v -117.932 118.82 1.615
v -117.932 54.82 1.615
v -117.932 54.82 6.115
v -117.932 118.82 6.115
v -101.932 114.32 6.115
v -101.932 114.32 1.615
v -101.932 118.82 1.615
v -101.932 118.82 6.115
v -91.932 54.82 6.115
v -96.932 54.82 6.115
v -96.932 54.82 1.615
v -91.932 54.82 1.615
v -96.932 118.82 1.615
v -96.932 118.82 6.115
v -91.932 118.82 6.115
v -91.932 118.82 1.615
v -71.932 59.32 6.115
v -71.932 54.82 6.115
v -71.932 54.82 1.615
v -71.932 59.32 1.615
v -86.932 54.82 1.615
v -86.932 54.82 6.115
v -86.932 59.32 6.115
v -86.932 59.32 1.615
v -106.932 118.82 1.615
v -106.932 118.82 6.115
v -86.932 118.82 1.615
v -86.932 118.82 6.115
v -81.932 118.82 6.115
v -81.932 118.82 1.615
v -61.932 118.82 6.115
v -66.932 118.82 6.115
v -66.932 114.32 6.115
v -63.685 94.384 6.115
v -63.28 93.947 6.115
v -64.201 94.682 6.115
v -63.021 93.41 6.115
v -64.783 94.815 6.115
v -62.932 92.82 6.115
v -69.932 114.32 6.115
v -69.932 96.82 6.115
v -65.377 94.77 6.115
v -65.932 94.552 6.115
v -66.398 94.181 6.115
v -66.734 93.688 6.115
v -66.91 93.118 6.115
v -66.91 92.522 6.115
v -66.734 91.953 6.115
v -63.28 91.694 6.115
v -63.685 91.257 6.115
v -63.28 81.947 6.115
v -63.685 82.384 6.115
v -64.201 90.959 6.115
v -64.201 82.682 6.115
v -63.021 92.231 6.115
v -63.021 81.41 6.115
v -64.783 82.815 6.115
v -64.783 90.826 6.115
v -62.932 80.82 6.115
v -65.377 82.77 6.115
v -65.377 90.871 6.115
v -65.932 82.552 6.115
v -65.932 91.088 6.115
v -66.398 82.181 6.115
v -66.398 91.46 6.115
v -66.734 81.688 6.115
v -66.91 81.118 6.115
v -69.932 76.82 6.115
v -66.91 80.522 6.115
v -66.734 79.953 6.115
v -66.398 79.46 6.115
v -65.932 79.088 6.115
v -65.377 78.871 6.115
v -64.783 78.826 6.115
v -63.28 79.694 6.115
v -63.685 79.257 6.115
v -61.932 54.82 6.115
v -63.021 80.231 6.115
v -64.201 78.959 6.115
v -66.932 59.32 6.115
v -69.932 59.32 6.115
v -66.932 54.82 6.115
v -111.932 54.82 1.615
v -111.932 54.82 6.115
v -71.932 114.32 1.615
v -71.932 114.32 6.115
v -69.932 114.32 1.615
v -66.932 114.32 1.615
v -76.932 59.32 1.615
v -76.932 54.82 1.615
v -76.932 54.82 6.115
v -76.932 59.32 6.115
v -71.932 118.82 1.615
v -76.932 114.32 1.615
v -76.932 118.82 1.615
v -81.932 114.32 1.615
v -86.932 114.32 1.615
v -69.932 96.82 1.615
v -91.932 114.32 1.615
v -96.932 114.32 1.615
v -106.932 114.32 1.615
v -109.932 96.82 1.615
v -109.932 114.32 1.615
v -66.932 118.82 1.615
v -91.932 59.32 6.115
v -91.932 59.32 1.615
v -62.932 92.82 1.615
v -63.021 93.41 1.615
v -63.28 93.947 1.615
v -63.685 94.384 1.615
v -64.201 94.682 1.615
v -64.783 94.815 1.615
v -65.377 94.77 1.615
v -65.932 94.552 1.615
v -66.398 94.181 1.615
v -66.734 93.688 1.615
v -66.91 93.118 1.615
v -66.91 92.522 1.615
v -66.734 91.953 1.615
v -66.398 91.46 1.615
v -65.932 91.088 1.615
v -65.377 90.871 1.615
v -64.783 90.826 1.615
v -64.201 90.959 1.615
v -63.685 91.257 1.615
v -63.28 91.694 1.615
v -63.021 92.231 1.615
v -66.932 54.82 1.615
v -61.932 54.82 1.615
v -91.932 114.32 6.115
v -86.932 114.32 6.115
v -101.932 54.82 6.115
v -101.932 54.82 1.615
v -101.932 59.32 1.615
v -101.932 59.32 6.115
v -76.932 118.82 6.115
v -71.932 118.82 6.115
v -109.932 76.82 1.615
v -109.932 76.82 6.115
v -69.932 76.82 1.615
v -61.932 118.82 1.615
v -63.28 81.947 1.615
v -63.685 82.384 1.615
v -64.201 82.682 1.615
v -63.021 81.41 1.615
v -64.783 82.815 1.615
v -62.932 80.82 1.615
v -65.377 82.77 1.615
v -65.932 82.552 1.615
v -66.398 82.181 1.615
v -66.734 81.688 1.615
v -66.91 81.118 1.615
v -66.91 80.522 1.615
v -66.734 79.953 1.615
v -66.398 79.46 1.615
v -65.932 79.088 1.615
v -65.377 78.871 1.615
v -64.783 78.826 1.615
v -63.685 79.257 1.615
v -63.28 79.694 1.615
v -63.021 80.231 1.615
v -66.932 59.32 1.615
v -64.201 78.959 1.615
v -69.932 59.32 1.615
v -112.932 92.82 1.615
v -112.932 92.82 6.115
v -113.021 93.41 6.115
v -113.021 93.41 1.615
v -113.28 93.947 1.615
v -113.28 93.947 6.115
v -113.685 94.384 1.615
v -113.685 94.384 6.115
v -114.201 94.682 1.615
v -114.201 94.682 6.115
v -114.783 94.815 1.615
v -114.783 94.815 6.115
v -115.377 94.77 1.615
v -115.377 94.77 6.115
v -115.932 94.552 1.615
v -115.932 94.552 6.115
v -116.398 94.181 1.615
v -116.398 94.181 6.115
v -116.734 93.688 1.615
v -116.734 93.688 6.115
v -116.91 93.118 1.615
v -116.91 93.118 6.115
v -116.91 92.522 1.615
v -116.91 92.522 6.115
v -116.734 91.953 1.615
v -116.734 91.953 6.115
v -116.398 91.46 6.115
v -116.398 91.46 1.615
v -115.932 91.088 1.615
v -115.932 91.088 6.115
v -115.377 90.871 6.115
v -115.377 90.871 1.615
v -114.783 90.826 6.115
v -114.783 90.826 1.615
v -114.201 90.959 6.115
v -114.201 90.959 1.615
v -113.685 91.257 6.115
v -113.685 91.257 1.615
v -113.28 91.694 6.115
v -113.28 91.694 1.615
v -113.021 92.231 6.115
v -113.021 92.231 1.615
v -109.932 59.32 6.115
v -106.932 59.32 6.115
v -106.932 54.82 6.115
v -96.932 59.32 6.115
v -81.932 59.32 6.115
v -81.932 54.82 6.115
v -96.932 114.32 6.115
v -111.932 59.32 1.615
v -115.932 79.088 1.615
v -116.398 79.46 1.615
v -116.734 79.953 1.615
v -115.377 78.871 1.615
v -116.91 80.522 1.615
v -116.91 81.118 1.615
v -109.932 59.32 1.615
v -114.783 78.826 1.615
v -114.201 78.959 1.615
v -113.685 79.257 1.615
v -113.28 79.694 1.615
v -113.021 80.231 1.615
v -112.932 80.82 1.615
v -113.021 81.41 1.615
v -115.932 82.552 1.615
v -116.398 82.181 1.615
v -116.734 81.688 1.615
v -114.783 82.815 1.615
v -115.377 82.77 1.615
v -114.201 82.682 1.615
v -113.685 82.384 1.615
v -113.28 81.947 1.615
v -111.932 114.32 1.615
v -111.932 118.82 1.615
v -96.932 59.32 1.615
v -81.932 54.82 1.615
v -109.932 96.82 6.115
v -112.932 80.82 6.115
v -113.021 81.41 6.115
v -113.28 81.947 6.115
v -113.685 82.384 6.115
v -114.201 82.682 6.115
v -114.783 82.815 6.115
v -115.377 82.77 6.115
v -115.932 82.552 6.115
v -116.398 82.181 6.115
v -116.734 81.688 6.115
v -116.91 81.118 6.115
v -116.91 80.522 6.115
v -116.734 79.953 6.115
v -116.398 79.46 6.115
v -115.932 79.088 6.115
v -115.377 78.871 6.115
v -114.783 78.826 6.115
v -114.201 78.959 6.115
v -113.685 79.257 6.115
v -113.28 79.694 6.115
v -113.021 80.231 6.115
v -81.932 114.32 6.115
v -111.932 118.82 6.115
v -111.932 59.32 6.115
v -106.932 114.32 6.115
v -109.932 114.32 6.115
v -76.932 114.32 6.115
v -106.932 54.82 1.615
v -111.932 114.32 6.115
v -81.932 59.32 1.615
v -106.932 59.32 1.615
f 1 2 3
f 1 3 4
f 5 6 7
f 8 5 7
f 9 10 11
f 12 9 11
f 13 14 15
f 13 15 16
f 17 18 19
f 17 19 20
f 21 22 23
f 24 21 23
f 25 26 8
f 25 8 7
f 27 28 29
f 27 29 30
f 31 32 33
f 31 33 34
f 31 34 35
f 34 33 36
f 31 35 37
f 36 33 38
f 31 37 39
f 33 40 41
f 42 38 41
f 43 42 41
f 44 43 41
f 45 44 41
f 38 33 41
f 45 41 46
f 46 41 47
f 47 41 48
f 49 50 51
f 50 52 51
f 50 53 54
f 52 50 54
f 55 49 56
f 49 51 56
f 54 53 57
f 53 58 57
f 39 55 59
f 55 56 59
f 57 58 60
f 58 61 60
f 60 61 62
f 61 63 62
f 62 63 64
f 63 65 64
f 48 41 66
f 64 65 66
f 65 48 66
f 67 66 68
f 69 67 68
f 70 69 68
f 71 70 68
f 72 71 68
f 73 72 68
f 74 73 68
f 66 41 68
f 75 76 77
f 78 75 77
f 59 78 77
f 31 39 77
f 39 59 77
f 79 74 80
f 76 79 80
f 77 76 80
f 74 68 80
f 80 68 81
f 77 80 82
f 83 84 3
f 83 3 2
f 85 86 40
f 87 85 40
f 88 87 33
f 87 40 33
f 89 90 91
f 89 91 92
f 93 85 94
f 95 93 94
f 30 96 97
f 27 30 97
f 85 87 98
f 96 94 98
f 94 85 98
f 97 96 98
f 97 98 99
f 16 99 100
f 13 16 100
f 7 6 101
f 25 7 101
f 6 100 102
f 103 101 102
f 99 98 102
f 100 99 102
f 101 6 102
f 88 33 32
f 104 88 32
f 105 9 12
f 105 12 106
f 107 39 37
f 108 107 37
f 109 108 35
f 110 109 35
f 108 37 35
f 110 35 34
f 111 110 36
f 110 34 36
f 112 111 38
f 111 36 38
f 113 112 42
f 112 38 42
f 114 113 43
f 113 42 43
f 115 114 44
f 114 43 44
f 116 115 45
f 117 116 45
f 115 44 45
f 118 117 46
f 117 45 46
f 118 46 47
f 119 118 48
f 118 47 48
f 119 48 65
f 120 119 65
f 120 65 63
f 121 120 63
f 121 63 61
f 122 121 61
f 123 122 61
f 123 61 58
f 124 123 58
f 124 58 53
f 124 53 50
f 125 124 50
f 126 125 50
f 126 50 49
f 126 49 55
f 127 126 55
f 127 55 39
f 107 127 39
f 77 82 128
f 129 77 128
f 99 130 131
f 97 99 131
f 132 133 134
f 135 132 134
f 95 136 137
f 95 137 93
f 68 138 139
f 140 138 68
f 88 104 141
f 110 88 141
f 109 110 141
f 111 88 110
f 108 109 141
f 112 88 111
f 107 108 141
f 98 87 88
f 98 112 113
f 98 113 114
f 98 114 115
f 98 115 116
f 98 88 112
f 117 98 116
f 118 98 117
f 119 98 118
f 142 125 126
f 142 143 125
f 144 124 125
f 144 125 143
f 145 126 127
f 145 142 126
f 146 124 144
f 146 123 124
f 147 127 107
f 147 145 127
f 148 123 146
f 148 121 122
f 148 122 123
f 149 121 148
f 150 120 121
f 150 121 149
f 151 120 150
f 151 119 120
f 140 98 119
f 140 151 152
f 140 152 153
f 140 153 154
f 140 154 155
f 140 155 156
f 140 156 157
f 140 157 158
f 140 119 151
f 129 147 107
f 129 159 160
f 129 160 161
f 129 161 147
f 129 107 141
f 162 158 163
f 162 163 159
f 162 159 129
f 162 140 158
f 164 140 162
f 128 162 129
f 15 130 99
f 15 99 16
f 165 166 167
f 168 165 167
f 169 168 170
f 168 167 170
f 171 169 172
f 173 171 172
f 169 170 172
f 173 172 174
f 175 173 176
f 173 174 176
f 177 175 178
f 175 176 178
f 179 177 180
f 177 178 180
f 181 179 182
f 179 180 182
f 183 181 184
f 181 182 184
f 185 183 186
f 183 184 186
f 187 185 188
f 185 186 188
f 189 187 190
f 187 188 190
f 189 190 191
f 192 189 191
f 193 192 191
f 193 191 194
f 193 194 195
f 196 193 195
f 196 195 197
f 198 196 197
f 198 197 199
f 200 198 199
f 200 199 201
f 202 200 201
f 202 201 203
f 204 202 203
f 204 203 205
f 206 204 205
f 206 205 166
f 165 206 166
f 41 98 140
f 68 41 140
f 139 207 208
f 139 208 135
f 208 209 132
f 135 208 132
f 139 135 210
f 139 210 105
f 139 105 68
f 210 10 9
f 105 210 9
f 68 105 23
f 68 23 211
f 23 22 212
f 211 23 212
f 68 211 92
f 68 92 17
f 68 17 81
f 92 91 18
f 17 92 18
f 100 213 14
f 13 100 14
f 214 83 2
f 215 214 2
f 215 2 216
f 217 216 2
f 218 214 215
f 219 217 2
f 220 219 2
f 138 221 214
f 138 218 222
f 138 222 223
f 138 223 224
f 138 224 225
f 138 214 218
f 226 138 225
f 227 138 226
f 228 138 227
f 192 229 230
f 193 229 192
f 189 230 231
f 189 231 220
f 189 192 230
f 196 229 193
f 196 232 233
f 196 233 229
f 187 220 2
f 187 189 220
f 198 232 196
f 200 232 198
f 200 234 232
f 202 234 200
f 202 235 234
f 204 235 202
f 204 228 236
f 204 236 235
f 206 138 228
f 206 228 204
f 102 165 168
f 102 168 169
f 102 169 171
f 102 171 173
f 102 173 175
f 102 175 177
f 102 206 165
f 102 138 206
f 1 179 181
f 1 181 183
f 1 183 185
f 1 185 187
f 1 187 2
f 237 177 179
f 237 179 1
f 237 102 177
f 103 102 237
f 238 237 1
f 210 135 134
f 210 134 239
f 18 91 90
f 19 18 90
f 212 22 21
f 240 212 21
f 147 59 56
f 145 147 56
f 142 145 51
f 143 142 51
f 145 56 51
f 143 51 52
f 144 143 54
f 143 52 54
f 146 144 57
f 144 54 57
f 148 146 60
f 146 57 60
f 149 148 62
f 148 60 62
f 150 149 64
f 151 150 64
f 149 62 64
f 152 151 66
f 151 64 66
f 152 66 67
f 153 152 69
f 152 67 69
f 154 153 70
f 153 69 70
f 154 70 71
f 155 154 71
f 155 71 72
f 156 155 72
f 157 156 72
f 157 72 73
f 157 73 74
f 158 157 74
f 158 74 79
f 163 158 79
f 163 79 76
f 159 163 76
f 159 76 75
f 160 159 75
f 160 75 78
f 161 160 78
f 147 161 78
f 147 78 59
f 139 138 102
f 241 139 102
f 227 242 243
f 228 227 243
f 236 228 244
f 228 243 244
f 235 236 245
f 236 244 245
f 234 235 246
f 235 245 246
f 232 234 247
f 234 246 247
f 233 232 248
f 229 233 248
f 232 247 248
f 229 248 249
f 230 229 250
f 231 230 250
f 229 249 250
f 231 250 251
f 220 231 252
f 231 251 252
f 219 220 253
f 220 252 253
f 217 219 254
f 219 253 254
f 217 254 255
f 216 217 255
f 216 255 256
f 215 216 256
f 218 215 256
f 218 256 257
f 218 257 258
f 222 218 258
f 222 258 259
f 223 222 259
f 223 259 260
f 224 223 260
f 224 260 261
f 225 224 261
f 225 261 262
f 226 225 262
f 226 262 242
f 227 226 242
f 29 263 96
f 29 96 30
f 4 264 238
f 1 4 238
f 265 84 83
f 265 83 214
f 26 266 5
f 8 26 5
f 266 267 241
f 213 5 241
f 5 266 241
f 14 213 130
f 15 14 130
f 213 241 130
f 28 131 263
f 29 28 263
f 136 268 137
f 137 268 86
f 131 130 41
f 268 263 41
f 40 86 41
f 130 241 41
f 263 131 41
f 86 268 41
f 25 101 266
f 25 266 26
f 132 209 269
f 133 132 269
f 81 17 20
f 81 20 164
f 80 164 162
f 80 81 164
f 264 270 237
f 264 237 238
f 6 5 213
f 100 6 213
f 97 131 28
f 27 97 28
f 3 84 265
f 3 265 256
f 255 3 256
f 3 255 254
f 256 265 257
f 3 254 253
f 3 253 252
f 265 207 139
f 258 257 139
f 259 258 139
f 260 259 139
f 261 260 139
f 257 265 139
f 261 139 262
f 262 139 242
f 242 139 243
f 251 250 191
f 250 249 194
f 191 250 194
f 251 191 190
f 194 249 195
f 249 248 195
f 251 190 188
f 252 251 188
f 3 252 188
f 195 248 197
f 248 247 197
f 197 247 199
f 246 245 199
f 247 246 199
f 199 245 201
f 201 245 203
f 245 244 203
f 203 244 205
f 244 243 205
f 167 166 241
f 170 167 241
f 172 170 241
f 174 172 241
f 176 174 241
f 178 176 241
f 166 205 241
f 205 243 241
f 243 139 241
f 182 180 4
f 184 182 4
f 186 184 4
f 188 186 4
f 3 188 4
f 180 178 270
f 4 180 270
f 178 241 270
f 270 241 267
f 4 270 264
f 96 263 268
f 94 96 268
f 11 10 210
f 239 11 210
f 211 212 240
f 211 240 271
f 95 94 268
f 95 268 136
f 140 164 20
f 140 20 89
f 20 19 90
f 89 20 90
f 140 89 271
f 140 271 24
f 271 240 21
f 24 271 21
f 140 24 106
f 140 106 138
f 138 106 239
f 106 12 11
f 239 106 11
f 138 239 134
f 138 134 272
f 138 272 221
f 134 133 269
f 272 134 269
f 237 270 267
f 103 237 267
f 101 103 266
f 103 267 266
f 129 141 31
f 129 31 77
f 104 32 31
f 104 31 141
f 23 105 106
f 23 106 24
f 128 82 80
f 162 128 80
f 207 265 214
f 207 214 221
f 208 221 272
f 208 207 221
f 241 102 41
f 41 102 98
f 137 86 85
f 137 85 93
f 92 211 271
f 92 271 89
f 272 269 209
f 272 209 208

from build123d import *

# Parameters (mm, degrees)
BOSS_EXTRUDE1_DEPTH   = 64
SKETCH2_W             = 40
SKETCH2_H             = 20
CUT_EXTRUDE1_DEPTH    = 30
SKETCH3_W             = 64
SKETCH3_H             = 4.5
BOSS_EXTRUDE2_DEPTH   = 8
SKETCH4_W             = 64
SKETCH4_H             = 4.5
BOSS_EXTRUDE3_DEPTH   = 8
SKETCH5_R             = 2
CUT_EXTRUDE6_DEPTH    = 7
SKETCH6_W             = 5
SKETCH6_H             = 4.5
CUT_EXTRUDE7_DEPTH    = 7
BODY_MOVE_COPY1_ANGLE = 90
BODY_MOVE_COPY2_ANGLE = 12.4160704


with BuildPart() as part:
    # Sketch1 → Boss-Extrude1 (new body)
    with BuildSketch(Plane.XY):
        Polygon((-70.899702081, 53.100294195), (-109.964182504, 44.499923896), (-108.996640846, 40.105169848), (-69.932160423, 48.705540147), align=None)
    extrude(amount=BOSS_EXTRUDE1_DEPTH)

    # Sketch2 → Cut-Extrude1 (cut)
    with BuildSketch(Plane(origin=(-14.427653835, 65.533085344, 0), x_dir=(0.9766120105757768, 0.21500925747311134, 0), z_dir=(-0.21500925747311134, 0.9766120105757768, 0))):
        with Locations((-77.824445772, -32)):
            Rectangle(SKETCH2_W, SKETCH2_H)
    extrude(amount=-CUT_EXTRUDE1_DEPTH, mode=Mode.SUBTRACT)


with BuildPart() as cut_extrude1_piece_1:
    # of the separate pieces the step leaves, piece 1, a body of its own (cut_extrude1_pieces)
    add(part.part.solids().sort_by_distance((-70.899702081, 53.100294195, 0))[0])



with BuildPart() as cut_extrude1_piece_2:
    # of the separate pieces the step leaves, piece 2, a body of its own (cut_extrude1_pieces)
    add(part.part.solids().sort_by_distance((-70.899702081, 53.100294195, 42))[0])


with BuildPart() as cut_extrude1_piece_1_1:
    add(cut_extrude1_piece_1.part)

    add(cut_extrude1_piece_2.part)  # Boss-Extrude2 merges Cut-Extrude1 piece 2
    # Sketch3 → Boss-Extrude2 (add)
    with BuildSketch(Plane(origin=(-56.472048246, -12.432791149, 0), x_dir=(0, 0, -1), z_dir=(0.976612010575777, 0.2150092574731111, 0))):
        with Locations((-32, 64.852477375)):
            Rectangle(SKETCH3_W, SKETCH3_H)
    extrude(amount=BOSS_EXTRUDE2_DEPTH)

    # Sketch4 → Boss-Extrude3 (add)
    with BuildSketch(Plane(origin=(-95.536528669, -21.033161448, 0), x_dir=(0, 0, 1), z_dir=(-0.9766120105757774, -0.21500925747310878, 0))):
        with Locations((32, 64.852477375)):
            Rectangle(SKETCH4_W, SKETCH4_H)
    extrude(amount=BOSS_EXTRUDE3_DEPTH)

    # Sketch5 → Cut-Extrude6 (cut)
    with BuildSketch(Plane(origin=(-13.460112176, 61.138331296, 0), x_dir=(0.976612010575777, 0.21500925747311095, 0), z_dir=(0.21500925747311095, -0.976612010575777, 0))):
        with Locations((-52.824445772, 26)):
            Circle(SKETCH5_R)
        with Locations((-52.824445772, 38)):
            Circle(SKETCH5_R)
        with Locations((-102.824445772, 26)):
            Circle(SKETCH5_R)
        with Locations((-102.824445772, 38)):
            Circle(SKETCH5_R)
    extrude(amount=-CUT_EXTRUDE6_DEPTH, mode=Mode.SUBTRACT)

    # Sketch6 → Cut-Extrude7 (cut)
    with BuildSketch(Plane(origin=(-13.460112176, 61.138331296, 0), x_dir=(0.976612010575777, 0.21500925747311095, 0), z_dir=(0.21500925747311095, -0.976612010575777, 0))):
        with Locations((-57.324445772, 2.25)):
            Rectangle(SKETCH6_W, SKETCH6_H)
        with Locations((-67.324445772, 2.25)):
            Rectangle(SKETCH6_W, SKETCH6_H)
        with Locations((-77.324445772, 2.25)):
            Rectangle(SKETCH6_W, SKETCH6_H)
        with Locations((-87.324445772, 2.25)):
            Rectangle(SKETCH6_W, SKETCH6_H)
        with Locations((-97.324445772, 2.25)):
            Rectangle(SKETCH6_W, SKETCH6_H)
        with Locations((-97.324445772, 61.75)):
            Rectangle(SKETCH6_W, SKETCH6_H)
        with Locations((-87.324445772, 61.75)):
            Rectangle(SKETCH6_W, SKETCH6_H)
        with Locations((-77.324445772, 61.75)):
            Rectangle(SKETCH6_W, SKETCH6_H)
        with Locations((-67.324445772, 61.75)):
            Rectangle(SKETCH6_W, SKETCH6_H)
        with Locations((-57.324445772, 61.75)):
            Rectangle(SKETCH6_W, SKETCH6_H)
    extrude(amount=-CUT_EXTRUDE7_DEPTH, mode=Mode.SUBTRACT)


with BuildPart() as cut_extrude1_piece_1_2:
    # Body-Move/Copy1: read off the stored shape, not the designer's step
    # Body-Move/Copy1: moved
    add(cut_extrude1_piece_1_1.part.moved(Location((0, -54.8203683, 54.8203683))).rotate(Axis((0, 0, 0), (-1, 0, 0)), BODY_MOVE_COPY1_ANGLE))


with BuildPart() as cut_extrude1_piece_1_3:
    # Body-Move/Copy2: read off the stored shape, not the designer's step
    # Body-Move/Copy2: moved
    add(cut_extrude1_piece_1_2.part.moved(Location((2.9503173, 0, 14.8930484))).rotate(Axis((0, 0, 0), (0, -1, 0)), BODY_MOVE_COPY2_ANGLE))


solid = cut_extrude1_piece_1_3.part
